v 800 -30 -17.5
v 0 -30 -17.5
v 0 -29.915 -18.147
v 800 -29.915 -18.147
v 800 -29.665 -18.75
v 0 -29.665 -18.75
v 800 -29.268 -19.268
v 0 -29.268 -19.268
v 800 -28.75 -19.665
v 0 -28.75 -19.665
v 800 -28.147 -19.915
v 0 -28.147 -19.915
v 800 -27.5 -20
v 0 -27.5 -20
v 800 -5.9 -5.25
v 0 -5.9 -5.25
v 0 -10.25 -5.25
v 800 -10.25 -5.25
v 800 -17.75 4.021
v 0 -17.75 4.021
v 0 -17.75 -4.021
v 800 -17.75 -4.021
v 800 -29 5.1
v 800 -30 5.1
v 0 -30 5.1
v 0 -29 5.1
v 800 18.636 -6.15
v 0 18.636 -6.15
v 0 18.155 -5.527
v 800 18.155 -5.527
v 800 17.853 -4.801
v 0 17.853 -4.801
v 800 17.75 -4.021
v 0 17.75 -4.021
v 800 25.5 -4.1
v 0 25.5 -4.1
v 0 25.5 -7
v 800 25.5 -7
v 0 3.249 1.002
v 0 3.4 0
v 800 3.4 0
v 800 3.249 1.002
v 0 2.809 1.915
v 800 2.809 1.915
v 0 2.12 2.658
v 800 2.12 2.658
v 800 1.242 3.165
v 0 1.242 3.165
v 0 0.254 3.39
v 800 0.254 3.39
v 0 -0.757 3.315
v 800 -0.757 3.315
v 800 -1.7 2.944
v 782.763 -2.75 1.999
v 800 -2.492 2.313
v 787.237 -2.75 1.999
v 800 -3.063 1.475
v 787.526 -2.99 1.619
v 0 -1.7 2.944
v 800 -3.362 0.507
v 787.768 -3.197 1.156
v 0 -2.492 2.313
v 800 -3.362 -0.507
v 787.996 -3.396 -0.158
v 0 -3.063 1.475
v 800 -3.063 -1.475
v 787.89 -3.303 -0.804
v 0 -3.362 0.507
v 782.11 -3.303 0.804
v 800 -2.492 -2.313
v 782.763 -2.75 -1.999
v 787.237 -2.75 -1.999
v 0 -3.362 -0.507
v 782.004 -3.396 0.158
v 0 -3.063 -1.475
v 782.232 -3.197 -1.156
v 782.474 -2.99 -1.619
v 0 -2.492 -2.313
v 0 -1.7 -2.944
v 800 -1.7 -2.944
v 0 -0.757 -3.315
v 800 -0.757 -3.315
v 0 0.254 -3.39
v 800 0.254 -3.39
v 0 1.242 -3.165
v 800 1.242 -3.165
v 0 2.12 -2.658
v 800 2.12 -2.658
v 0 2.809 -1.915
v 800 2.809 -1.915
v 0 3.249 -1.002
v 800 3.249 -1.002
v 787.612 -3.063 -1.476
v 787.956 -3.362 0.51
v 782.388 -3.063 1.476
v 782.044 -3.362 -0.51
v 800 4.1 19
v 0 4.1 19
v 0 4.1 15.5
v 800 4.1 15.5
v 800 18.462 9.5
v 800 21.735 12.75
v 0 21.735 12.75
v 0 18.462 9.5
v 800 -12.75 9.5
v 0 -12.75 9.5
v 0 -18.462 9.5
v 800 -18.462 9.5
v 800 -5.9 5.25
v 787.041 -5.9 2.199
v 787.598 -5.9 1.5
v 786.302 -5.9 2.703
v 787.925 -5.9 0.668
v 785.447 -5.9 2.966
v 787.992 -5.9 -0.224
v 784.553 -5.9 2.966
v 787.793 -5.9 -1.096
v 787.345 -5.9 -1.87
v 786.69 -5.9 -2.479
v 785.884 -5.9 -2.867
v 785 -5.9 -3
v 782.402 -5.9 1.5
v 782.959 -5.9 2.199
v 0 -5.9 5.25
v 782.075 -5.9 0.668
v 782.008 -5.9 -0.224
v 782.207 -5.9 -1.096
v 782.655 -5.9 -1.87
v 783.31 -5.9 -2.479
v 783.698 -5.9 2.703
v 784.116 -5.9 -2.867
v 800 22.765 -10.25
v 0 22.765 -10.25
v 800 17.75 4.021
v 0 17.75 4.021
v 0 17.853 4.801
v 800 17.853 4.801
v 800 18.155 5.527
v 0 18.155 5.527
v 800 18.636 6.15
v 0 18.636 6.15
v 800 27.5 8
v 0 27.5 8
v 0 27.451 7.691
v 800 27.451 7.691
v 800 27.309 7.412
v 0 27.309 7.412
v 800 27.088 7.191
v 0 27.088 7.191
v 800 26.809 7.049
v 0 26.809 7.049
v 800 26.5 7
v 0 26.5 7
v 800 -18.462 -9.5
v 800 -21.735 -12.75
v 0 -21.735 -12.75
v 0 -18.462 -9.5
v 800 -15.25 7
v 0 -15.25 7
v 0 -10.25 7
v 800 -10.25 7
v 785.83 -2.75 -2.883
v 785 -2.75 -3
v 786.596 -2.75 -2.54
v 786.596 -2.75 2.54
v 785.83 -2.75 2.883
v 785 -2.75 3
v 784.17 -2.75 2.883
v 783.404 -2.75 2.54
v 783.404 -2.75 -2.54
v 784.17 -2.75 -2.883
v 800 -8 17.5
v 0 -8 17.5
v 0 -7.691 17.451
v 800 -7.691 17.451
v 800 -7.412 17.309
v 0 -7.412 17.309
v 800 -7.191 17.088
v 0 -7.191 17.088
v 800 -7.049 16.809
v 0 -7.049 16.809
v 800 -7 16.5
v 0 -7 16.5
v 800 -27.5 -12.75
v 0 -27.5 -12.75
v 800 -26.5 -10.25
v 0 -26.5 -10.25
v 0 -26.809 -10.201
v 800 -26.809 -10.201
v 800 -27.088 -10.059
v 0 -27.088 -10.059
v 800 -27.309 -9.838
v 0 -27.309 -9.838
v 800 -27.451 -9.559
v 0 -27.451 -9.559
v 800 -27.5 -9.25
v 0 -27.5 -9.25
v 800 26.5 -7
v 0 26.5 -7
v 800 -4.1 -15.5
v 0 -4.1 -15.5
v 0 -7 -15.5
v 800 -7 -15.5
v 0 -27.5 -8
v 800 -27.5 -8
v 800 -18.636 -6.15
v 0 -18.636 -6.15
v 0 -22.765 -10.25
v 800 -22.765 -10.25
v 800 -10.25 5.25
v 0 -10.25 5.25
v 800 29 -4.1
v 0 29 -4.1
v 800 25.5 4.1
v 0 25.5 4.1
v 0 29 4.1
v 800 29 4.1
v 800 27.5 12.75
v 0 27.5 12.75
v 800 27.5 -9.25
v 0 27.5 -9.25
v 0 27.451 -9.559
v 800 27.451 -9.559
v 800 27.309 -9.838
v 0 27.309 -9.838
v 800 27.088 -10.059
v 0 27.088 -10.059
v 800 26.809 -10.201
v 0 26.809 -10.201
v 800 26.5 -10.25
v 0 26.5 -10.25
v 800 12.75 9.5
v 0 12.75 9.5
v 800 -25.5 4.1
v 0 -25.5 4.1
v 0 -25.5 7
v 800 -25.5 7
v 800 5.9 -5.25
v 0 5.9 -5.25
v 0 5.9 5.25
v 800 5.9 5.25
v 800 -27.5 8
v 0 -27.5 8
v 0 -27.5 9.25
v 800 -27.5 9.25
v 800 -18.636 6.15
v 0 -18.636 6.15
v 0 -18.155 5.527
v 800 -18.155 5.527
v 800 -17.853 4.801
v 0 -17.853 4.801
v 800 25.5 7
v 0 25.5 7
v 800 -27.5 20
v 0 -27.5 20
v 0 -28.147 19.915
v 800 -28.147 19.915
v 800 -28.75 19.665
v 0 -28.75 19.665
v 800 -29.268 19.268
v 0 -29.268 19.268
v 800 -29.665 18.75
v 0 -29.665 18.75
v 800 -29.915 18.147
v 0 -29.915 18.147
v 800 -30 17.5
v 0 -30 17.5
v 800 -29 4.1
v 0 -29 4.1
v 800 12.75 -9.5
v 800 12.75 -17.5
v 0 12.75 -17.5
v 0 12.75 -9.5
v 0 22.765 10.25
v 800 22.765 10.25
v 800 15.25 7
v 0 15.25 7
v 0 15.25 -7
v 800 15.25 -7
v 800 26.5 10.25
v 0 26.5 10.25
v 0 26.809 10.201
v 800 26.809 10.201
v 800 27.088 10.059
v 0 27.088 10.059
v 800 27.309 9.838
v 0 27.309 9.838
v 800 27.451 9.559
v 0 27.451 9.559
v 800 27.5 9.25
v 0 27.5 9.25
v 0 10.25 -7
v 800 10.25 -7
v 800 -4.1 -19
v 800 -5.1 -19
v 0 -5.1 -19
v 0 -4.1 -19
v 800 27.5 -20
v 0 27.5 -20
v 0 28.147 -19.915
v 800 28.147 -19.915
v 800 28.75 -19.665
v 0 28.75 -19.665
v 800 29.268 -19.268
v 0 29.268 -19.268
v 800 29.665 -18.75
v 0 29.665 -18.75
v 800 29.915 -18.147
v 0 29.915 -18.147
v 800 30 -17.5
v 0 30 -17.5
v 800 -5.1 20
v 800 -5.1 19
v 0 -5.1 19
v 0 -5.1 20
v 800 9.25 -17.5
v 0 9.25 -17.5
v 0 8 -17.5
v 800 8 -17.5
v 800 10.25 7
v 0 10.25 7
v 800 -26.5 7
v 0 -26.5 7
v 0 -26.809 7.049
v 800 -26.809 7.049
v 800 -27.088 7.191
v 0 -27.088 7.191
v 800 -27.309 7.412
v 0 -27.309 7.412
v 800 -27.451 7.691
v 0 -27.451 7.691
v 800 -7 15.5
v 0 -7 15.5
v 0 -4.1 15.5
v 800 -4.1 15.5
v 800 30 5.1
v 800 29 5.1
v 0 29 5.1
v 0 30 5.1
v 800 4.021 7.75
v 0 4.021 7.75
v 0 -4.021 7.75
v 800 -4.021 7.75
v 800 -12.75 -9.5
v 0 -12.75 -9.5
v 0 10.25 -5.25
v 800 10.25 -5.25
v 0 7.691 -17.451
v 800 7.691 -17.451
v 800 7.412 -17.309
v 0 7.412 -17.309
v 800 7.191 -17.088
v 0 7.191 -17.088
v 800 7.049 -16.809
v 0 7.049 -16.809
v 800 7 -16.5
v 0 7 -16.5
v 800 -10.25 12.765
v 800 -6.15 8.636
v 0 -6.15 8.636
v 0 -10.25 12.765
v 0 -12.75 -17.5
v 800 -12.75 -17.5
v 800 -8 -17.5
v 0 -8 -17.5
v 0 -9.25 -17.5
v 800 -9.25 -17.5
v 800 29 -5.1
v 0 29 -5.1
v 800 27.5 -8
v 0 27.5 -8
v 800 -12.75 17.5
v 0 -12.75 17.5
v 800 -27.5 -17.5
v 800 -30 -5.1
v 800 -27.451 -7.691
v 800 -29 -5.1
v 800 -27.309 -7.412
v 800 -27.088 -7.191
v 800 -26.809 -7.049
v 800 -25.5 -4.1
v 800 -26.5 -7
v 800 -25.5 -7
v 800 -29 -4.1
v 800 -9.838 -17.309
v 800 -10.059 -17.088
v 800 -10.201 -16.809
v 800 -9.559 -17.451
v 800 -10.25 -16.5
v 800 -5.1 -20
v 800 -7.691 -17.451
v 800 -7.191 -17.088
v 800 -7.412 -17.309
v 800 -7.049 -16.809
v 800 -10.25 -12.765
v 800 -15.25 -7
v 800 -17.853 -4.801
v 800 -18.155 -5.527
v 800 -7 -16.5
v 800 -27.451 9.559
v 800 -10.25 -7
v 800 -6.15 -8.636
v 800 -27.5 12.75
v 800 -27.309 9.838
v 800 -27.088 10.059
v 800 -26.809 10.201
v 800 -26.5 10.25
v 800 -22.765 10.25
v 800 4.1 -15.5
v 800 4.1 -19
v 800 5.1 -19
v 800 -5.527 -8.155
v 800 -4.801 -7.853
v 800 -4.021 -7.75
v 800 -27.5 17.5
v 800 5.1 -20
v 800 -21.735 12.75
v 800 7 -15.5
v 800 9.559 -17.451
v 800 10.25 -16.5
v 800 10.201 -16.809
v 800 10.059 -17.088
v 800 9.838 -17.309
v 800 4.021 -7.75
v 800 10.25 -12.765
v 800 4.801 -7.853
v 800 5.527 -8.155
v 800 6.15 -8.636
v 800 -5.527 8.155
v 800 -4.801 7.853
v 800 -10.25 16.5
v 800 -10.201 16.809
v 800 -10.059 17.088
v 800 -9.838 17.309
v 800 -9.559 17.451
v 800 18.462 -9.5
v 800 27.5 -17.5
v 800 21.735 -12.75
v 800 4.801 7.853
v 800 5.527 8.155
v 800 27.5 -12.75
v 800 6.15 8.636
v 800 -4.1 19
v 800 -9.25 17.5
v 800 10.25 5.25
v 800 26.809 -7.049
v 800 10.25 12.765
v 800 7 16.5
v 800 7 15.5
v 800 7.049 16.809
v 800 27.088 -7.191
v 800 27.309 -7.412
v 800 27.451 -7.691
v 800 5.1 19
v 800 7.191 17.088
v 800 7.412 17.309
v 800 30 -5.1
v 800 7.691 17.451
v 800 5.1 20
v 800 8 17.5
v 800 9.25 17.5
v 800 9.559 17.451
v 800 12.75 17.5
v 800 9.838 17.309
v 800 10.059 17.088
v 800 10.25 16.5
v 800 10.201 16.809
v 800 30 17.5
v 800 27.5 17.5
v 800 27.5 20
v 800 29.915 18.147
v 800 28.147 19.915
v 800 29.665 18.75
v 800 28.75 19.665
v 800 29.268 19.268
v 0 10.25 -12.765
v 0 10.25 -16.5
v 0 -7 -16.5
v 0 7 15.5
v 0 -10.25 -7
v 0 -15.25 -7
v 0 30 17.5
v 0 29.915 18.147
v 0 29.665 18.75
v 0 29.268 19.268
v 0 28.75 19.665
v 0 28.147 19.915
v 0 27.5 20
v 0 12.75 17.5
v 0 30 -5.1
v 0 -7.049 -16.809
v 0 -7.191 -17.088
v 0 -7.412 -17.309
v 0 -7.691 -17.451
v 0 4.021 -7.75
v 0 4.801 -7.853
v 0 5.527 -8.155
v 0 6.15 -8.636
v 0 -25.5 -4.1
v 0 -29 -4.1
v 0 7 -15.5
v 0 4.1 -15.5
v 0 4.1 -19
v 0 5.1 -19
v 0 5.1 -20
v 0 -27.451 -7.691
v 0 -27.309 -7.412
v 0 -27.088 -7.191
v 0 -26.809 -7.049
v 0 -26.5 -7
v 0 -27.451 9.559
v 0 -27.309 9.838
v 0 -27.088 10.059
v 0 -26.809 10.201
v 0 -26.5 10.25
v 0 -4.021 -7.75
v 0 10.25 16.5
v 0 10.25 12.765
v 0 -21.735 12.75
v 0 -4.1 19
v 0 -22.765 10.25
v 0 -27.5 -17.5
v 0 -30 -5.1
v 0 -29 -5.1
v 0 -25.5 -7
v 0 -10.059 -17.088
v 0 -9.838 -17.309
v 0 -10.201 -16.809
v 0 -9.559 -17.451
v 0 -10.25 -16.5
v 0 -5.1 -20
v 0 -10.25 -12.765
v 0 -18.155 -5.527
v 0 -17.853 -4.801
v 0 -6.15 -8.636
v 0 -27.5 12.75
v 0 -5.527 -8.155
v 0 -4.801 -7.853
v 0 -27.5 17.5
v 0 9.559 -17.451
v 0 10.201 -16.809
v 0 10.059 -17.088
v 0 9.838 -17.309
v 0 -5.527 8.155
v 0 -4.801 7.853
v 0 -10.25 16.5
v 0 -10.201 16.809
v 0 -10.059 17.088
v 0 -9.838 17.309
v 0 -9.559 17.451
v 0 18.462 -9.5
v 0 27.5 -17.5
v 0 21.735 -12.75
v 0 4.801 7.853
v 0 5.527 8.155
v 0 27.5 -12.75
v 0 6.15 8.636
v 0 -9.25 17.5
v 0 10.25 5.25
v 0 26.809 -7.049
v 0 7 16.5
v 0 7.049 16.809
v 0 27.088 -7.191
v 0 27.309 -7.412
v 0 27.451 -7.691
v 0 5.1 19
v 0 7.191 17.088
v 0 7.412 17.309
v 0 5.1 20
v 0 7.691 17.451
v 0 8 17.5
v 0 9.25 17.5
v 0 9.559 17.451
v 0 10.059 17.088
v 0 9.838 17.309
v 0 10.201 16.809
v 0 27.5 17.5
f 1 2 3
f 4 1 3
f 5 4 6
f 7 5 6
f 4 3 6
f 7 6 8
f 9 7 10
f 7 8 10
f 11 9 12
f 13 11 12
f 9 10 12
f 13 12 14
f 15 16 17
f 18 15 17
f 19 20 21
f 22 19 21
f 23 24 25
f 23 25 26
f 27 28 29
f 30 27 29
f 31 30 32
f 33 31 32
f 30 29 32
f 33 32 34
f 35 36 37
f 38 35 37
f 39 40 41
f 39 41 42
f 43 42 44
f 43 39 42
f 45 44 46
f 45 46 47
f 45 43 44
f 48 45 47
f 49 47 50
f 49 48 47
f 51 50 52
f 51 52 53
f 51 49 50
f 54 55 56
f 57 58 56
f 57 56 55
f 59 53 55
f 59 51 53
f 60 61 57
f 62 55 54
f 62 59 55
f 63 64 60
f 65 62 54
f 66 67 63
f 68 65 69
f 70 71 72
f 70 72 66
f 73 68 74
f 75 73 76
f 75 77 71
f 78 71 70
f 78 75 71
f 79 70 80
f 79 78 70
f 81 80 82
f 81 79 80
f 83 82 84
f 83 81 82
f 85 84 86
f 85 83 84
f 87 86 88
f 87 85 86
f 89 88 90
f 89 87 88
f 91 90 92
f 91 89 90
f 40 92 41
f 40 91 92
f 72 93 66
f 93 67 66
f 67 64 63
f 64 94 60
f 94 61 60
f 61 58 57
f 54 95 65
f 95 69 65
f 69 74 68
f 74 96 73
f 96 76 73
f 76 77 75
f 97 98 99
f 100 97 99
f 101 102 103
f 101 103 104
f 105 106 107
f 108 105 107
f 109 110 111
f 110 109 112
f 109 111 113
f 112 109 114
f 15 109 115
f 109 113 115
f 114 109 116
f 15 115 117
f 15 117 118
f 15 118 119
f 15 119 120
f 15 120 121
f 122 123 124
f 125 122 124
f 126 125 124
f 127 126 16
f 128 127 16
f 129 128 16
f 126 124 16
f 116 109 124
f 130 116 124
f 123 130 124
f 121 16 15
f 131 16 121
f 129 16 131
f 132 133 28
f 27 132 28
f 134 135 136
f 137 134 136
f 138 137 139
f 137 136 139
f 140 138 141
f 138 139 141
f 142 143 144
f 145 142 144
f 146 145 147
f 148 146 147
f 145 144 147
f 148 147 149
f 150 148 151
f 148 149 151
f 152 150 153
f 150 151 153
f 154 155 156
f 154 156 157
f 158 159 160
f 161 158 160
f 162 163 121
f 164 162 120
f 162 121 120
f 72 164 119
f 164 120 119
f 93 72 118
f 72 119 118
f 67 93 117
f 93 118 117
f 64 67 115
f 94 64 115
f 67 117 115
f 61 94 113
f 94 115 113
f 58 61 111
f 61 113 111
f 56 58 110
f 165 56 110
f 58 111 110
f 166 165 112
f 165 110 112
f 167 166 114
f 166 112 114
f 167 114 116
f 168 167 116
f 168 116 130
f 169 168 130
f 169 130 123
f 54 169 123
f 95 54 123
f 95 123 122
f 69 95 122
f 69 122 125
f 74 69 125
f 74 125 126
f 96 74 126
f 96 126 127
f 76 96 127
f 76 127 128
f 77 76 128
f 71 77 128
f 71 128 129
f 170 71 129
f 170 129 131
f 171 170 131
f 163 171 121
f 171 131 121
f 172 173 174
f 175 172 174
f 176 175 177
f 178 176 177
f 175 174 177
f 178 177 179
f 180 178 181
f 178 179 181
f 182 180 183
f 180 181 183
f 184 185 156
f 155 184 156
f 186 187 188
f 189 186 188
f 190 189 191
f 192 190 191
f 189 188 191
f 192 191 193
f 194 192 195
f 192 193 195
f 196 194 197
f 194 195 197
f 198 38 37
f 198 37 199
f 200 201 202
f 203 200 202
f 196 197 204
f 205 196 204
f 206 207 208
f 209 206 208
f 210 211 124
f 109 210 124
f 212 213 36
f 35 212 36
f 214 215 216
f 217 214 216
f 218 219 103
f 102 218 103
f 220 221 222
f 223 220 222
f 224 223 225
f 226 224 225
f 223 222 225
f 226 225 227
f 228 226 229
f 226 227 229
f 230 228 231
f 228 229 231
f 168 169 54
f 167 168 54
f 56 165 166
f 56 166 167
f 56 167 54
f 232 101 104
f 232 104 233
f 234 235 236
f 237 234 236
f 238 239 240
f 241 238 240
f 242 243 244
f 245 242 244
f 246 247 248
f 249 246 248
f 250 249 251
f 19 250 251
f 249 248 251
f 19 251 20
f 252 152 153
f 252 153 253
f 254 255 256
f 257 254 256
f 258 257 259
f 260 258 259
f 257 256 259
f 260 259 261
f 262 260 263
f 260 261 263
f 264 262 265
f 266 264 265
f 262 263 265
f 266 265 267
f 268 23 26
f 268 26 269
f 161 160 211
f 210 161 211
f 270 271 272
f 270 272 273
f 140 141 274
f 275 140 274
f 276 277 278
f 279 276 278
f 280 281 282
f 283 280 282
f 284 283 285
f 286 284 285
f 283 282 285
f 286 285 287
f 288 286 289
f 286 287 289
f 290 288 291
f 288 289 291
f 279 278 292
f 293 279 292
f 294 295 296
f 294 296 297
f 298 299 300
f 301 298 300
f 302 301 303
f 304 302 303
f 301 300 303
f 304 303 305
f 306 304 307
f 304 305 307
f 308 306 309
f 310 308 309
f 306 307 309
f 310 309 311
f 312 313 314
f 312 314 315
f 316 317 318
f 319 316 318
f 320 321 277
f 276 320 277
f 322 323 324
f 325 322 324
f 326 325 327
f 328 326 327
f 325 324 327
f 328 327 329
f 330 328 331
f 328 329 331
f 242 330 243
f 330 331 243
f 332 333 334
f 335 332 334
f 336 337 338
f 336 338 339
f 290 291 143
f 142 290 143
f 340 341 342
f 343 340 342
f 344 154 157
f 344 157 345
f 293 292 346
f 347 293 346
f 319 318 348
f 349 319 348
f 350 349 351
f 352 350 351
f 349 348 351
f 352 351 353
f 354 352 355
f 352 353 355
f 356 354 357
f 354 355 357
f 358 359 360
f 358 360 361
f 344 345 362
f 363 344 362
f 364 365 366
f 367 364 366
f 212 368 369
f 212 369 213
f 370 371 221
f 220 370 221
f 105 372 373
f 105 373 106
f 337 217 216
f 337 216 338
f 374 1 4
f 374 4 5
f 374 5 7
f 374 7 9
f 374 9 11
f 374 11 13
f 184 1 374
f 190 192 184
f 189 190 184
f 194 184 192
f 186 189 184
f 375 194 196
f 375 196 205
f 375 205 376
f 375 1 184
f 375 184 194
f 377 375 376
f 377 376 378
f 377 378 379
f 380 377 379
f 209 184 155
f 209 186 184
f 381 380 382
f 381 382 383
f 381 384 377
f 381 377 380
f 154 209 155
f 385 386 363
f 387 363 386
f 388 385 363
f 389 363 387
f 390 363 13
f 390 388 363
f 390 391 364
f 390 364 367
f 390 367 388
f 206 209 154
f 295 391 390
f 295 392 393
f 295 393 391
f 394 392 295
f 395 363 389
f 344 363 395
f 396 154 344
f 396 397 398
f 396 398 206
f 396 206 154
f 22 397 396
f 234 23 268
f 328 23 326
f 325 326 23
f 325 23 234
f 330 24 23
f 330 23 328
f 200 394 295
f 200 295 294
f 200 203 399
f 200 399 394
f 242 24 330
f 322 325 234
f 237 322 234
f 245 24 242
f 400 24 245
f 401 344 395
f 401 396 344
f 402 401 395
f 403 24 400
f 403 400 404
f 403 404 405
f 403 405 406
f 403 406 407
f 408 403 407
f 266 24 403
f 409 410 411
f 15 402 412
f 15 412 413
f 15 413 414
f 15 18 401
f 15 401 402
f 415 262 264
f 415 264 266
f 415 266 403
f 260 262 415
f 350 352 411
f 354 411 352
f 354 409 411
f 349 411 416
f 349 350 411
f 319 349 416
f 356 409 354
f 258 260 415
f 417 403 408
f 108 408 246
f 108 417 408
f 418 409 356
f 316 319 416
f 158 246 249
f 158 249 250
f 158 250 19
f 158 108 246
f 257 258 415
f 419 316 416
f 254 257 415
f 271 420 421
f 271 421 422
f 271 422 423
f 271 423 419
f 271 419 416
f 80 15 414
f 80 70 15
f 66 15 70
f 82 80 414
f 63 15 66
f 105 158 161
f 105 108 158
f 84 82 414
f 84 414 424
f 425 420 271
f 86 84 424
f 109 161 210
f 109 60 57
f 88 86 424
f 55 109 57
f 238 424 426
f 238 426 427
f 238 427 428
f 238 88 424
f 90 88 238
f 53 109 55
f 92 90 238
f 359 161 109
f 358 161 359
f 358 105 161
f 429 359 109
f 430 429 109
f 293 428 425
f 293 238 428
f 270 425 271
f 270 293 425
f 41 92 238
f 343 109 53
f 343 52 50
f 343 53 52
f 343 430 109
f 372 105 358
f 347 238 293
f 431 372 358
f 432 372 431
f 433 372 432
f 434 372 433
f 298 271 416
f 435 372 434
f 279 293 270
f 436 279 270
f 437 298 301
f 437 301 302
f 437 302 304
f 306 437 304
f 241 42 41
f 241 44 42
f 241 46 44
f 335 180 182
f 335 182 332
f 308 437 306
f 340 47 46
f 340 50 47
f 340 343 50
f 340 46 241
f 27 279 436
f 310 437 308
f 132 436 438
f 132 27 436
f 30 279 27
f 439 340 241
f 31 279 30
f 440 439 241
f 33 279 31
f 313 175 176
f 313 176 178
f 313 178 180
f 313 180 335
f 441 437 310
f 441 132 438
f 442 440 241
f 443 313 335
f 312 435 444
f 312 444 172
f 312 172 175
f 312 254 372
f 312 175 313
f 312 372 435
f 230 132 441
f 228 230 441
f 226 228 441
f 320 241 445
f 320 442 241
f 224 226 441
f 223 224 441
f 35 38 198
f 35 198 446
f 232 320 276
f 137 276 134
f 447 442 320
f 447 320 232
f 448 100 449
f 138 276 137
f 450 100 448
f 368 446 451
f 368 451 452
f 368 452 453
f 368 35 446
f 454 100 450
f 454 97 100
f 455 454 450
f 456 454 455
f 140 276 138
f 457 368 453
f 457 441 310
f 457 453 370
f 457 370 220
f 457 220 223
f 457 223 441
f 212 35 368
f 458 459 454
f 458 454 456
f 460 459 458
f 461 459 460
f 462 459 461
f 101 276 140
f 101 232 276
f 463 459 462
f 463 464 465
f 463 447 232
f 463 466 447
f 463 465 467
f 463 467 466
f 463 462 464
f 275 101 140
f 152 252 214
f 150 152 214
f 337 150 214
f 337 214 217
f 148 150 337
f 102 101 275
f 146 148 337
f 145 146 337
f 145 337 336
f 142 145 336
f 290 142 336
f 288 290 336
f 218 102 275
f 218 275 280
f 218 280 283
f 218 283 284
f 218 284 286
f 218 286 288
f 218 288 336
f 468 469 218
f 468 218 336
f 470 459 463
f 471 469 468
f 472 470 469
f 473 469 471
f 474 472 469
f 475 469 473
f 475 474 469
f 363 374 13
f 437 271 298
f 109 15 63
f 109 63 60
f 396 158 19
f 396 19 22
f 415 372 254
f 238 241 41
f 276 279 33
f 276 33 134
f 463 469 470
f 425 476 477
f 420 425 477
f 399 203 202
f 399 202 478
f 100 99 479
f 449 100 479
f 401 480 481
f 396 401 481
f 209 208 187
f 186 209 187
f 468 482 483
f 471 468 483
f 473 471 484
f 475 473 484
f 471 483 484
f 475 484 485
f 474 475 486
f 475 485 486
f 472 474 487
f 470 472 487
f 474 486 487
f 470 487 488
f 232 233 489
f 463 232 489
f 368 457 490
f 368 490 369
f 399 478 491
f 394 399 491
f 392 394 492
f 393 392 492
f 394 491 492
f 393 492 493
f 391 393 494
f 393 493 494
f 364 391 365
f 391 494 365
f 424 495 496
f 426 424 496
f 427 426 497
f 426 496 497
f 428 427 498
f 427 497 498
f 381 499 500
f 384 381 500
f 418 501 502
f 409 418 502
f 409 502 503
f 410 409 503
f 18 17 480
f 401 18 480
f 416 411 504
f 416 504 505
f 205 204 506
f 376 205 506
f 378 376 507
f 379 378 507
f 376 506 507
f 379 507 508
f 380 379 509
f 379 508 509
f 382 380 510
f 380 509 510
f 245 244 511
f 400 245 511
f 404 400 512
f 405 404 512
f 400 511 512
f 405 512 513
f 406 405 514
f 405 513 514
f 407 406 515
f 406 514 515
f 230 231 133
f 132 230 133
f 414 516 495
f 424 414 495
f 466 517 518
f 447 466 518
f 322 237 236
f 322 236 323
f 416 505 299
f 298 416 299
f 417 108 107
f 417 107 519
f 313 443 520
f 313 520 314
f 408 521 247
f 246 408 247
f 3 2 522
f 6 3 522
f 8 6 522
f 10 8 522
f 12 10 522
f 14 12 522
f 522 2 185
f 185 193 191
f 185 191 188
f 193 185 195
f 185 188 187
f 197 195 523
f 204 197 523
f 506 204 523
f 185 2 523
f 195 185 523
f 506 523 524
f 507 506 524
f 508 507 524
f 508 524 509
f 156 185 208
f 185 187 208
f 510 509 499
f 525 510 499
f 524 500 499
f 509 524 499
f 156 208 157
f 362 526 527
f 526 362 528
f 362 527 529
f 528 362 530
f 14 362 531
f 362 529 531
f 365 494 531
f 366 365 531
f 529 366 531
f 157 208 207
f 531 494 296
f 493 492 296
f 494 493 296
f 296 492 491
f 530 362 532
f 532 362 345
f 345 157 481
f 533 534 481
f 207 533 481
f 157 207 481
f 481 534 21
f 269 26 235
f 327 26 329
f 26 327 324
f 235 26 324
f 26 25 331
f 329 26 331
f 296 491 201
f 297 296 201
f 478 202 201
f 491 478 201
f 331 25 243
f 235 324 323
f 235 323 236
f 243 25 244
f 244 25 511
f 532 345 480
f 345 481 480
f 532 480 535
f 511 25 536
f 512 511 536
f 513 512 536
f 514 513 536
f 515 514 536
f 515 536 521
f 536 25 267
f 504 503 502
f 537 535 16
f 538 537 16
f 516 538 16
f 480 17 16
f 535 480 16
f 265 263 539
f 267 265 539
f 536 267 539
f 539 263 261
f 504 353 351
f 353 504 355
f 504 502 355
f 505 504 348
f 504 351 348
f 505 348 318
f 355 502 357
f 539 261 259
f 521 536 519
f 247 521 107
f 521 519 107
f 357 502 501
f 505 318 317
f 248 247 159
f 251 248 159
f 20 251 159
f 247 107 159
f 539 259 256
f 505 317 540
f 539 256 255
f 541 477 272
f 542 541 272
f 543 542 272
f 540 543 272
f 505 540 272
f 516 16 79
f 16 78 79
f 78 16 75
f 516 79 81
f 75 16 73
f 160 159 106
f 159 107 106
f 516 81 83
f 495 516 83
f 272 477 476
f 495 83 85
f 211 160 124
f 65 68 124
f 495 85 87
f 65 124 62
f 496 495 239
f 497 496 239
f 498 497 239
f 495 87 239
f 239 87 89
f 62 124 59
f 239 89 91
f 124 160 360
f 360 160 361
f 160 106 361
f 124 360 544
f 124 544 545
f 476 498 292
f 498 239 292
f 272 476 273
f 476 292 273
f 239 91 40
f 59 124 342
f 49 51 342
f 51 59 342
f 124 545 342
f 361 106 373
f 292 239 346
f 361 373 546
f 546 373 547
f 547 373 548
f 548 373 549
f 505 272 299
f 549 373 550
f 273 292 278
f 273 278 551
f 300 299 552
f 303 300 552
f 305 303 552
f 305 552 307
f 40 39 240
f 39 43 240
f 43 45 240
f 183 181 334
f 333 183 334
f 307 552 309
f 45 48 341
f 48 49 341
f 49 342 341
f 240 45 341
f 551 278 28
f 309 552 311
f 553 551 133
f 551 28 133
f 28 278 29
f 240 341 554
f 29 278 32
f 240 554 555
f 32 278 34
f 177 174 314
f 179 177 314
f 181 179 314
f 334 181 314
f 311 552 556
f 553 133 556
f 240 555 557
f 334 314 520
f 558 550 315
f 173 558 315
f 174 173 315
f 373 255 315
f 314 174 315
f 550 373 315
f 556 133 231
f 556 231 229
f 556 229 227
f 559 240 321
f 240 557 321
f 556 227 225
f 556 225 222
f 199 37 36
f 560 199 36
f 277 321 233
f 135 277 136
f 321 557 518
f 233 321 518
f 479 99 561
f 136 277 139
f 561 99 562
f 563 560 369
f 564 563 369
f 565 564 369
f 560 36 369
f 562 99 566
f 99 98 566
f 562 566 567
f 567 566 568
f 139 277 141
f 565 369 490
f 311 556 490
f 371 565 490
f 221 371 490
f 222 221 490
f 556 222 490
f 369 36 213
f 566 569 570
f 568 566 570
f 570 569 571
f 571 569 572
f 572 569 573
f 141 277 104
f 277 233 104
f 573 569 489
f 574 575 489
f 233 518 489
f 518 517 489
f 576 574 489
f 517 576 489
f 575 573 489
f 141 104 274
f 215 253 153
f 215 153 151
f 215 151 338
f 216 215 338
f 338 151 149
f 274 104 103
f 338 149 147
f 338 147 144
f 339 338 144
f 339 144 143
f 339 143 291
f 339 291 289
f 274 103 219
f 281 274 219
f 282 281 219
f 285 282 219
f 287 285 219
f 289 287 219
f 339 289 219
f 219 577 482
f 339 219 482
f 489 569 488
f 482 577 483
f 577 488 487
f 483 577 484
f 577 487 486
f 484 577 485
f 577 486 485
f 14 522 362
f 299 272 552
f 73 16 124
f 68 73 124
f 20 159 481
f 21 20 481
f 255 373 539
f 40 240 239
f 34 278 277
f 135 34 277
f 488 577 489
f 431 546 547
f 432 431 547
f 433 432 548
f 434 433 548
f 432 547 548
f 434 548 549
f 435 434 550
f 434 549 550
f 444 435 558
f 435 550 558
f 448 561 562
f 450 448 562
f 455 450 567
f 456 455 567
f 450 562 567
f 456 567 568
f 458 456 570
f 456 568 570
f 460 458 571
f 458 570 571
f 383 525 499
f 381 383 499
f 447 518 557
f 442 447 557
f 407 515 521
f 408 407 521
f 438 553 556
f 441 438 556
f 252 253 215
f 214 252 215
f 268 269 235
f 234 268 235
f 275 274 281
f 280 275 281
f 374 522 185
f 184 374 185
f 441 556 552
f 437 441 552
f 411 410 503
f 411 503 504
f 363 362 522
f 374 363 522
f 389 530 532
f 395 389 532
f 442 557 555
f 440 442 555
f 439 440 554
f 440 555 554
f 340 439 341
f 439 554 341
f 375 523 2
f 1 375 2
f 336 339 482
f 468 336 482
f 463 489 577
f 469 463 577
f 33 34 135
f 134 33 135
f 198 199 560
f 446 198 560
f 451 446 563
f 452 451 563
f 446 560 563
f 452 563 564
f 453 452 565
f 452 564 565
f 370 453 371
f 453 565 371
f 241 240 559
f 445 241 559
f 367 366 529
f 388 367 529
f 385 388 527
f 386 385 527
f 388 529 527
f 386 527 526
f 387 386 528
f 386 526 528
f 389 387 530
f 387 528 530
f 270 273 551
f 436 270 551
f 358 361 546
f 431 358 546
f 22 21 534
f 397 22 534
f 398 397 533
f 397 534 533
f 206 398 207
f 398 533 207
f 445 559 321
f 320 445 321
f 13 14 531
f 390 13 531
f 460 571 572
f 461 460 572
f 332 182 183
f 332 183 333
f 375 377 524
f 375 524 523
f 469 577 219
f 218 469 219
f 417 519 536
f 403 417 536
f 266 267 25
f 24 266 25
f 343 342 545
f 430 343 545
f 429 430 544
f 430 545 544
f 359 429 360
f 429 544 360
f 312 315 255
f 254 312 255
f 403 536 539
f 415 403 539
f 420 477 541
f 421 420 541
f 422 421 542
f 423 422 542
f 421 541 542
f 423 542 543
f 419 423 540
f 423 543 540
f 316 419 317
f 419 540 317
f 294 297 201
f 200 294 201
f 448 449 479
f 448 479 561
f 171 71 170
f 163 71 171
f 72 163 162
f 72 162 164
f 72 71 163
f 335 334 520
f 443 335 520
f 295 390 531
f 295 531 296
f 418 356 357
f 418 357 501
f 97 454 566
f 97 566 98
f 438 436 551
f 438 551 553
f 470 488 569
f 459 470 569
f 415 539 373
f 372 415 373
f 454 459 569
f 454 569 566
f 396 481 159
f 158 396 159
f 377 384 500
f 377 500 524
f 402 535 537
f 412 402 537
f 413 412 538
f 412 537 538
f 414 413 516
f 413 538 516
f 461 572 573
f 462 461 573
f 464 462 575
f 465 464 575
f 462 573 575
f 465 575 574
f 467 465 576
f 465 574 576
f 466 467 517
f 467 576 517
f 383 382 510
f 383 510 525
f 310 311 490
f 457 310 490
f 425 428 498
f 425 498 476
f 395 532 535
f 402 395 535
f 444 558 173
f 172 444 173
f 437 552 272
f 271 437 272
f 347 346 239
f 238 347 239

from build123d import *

# Parameters (mm, degrees)
SKETCH_19_R           = 3.4
MEMBER_4060_A_1_DEPTH = 800
SKETCH_14_R           = 3
CUT_EXTRUDE_1_DEPTH   = 10


with BuildPart() as part:
    # 草图19 → Member 4060-a _1 (new body)
    with BuildSketch(Plane.YZ):
        with BuildLine():
            Line((10.25, 16.5), (10.25, 12.765240679))
            Line((10.25, 12.765240679), (6.149583391, 8.63609737))
            ThreePointArc((6.149583391, 8.63609737), (5.17375715, 7.980369349), (4.020871182, 7.75))
            Line((4.020871182, 7.75), (-4.020871182, 7.75))
            ThreePointArc((-4.020871182, 7.75), (-5.17375715, 7.980369349), (-6.149583391, 8.63609737))
            Line((-6.149583391, 8.63609737), (-10.25, 12.765240679))
            Line((-10.25, 12.765240679), (-10.25, 16.5))
            ThreePointArc((-10.25, 16.5), (-9.957106781, 17.207106781), (-9.25, 17.5))
            Line((-9.25, 17.5), (-8, 17.5))
            ThreePointArc((-8, 17.5), (-7.292893219, 17.207106781), (-7, 16.5))
            Line((-7, 16.5), (-7, 15.5))
            Line((-7, 15.5), (-4.1, 15.5))
            Line((-4.1, 15.5), (-4.1, 19))
            Line((-4.1, 19), (-5.1, 19))
            Line((-5.1, 19), (-5.1, 20))
            Line((-5.1, 20), (-27.5, 20))
            ThreePointArc((-27.5, 20), (-29.267766953, 19.267766953), (-30, 17.5))
            Line((-30, 17.5), (-30, 5.1))
            Line((-30, 5.1), (-29, 5.1))
            Line((-29, 5.1), (-29, 4.1))
            Line((-29, 4.1), (-25.5, 4.1))
            Line((-25.5, 4.1), (-25.5, 7))
            Line((-25.5, 7), (-26.5, 7))
            ThreePointArc((-26.5, 7), (-27.207106781, 7.292893219), (-27.5, 8))
            Line((-27.5, 8), (-27.5, 9.25))
            ThreePointArc((-27.5, 9.25), (-27.207106781, 9.957106781), (-26.5, 10.25))
            Line((-26.5, 10.25), (-22.765240679, 10.25))
            Line((-22.765240679, 10.25), (-18.63609737, 6.149583391))
            ThreePointArc((-18.63609737, 6.149583391), (-17.980369349, 5.17375715), (-17.75, 4.020871182))
            Line((-17.75, 4.020871182), (-17.75, -4.020871182))
            ThreePointArc((-17.75, -4.020871182), (-17.980369349, -5.17375715), (-18.63609737, -6.149583391))
            Line((-18.63609737, -6.149583391), (-22.765240679, -10.25))
            Line((-22.765240679, -10.25), (-26.5, -10.25))
            ThreePointArc((-26.5, -10.25), (-27.207106781, -9.957106781), (-27.5, -9.25))
            Line((-27.5, -9.25), (-27.5, -8))
            ThreePointArc((-27.5, -8), (-27.207106781, -7.292893219), (-26.5, -7))
            Line((-26.5, -7), (-25.5, -7))
            Line((-25.5, -7), (-25.5, -4.1))
            Line((-25.5, -4.1), (-29, -4.1))
            Line((-29, -4.1), (-29, -5.1))
            Line((-29, -5.1), (-30, -5.1))
            Line((-30, -5.1), (-30, -17.5))
            ThreePointArc((-30, -17.5), (-29.267766953, -19.267766953), (-27.5, -20))
            Line((-27.5, -20), (-5.1, -20))
            Line((-5.1, -20), (-5.1, -19))
            Line((-5.1, -19), (-4.1, -19))
            Line((-4.1, -19), (-4.1, -15.5))
            Line((-4.1, -15.5), (-7, -15.5))
            Line((-7, -15.5), (-7, -16.5))
            ThreePointArc((-7, -16.5), (-7.292893219, -17.207106781), (-8, -17.5))
            Line((-8, -17.5), (-9.25, -17.5))
            ThreePointArc((-9.25, -17.5), (-9.957106781, -17.207106781), (-10.25, -16.5))
            Line((-10.25, -16.5), (-10.25, -12.765240679))
            Line((-10.25, -12.765240679), (-6.149583391, -8.63609737))
            ThreePointArc((-6.149583391, -8.63609737), (-5.17375715, -7.980369349), (-4.020871182, -7.75))
            Line((-4.020871182, -7.75), (4.020871182, -7.75))
            ThreePointArc((4.020871182, -7.75), (5.17375715, -7.980369349), (6.149583391, -8.63609737))
            Line((6.149583391, -8.63609737), (10.25, -12.765240679))
            Line((10.25, -12.765240679), (10.25, -16.5))
            ThreePointArc((10.25, -16.5), (9.957106781, -17.207106781), (9.25, -17.5))
            Line((9.25, -17.5), (8, -17.5))
            ThreePointArc((8, -17.5), (7.292893219, -17.207106781), (7, -16.5))
            Line((7, -16.5), (7, -15.5))
            Line((7, -15.5), (4.1, -15.5))
            Line((4.1, -15.5), (4.1, -19))
            Line((4.1, -19), (5.1, -19))
            Line((5.1, -19), (5.1, -20))
            Line((5.1, -20), (27.5, -20))
            ThreePointArc((27.5, -20), (29.267766953, -19.267766953), (30, -17.5))
            Line((30, -17.5), (30, -5.1))
            Line((30, -5.1), (29, -5.1))
            Line((29, -5.1), (29, -4.1))
            Line((29, -4.1), (25.5, -4.1))
            Line((25.5, -4.1), (25.5, -7))
            Line((25.5, -7), (26.5, -7))
            ThreePointArc((26.5, -7), (27.207106781, -7.292893219), (27.5, -8))
            Line((27.5, -8), (27.5, -9.25))
            ThreePointArc((27.5, -9.25), (27.207106781, -9.957106781), (26.5, -10.25))
            Line((26.5, -10.25), (22.765240679, -10.25))
            Line((22.765240679, -10.25), (18.63609737, -6.149583391))
            ThreePointArc((18.63609737, -6.149583391), (17.980369349, -5.17375715), (17.75, -4.020871182))
            Line((17.75, -4.020871182), (17.75, 4.020871182))
            ThreePointArc((17.75, 4.020871182), (17.980369349, 5.17375715), (18.63609737, 6.149583391))
            Line((18.63609737, 6.149583391), (22.765240679, 10.25))
            Line((22.765240679, 10.25), (26.5, 10.25))
            ThreePointArc((26.5, 10.25), (27.207106781, 9.957106781), (27.5, 9.25))
            Line((27.5, 9.25), (27.5, 8))
            ThreePointArc((27.5, 8), (27.207106781, 7.292893219), (26.5, 7))
            Line((26.5, 7), (25.5, 7))
            Line((25.5, 7), (25.5, 4.1))
            Line((25.5, 4.1), (29, 4.1))
            Line((29, 4.1), (29, 5.1))
            Line((29, 5.1), (30, 5.1))
            Line((30, 5.1), (30, 17.5))
            ThreePointArc((30, 17.5), (29.267766953, 19.267766953), (27.5, 20))
            Line((27.5, 20), (5.1, 20))
            Line((5.1, 20), (5.1, 19))
            Line((5.1, 19), (4.1, 19))
            Line((4.1, 19), (4.1, 15.5))
            Line((4.1, 15.5), (7, 15.5))
            Line((7, 15.5), (7, 16.5))
            ThreePointArc((7, 16.5), (7.292893219, 17.207106781), (8, 17.5))
            Line((8, 17.5), (9.25, 17.5))
            ThreePointArc((9.25, 17.5), (9.957106781, 17.207106781), (10.25, 16.5))
        make_face()
        Circle(SKETCH_19_R, mode=Mode.SUBTRACT)
        Polygon((27.5, -12.75), (27.5, -17.5), (12.75, -17.5), (12.75, -9.5), (18.462046185, -9.5), (21.734815036, -12.75), align=None, mode=Mode.SUBTRACT)
        Polygon((5.9, 5.25), (10.25, 5.25), (10.25, 7), (15.25, 7), (15.25, -7), (10.25, -7), (10.25, -5.25), (5.9, -5.25), align=None, mode=Mode.SUBTRACT)
        Polygon((-27.5, 12.75), (-27.5, 17.5), (-12.75, 17.5), (-12.75, 9.5), (-18.462046185, 9.5), (-21.734815036, 12.75), align=None, mode=Mode.SUBTRACT)
        Polygon((27.5, 17.5), (27.5, 12.75), (21.734815036, 12.75), (18.462046185, 9.5), (12.75, 9.5), (12.75, 17.5), align=None, mode=Mode.SUBTRACT)
        Polygon((-10.25, 7), (-10.25, 5.25), (-5.9, 5.25), (-5.9, -5.25), (-10.25, -5.25), (-10.25, -7), (-15.25, -7), (-15.25, 7), align=None, mode=Mode.SUBTRACT)
        Polygon((-27.5, -17.5), (-27.5, -12.75), (-21.734815036, -12.75), (-18.462046185, -9.5), (-12.75, -9.5), (-12.75, -17.5), align=None, mode=Mode.SUBTRACT)
    extrude(amount=MEMBER_4060_A_1_DEPTH)

    # 草图14 → 切除-拉伸1 (cut)
    with BuildSketch(Plane(origin=(0, -12.75, 0), x_dir=(-1, 0, 0), z_dir=(0, -1, 0))):
        with Locations(Location((-785, 0, 0), (0, 0, 90))):
            Circle(SKETCH_14_R)
    extrude(amount=-CUT_EXTRUDE_1_DEPTH, mode=Mode.SUBTRACT)


solid = part.part
